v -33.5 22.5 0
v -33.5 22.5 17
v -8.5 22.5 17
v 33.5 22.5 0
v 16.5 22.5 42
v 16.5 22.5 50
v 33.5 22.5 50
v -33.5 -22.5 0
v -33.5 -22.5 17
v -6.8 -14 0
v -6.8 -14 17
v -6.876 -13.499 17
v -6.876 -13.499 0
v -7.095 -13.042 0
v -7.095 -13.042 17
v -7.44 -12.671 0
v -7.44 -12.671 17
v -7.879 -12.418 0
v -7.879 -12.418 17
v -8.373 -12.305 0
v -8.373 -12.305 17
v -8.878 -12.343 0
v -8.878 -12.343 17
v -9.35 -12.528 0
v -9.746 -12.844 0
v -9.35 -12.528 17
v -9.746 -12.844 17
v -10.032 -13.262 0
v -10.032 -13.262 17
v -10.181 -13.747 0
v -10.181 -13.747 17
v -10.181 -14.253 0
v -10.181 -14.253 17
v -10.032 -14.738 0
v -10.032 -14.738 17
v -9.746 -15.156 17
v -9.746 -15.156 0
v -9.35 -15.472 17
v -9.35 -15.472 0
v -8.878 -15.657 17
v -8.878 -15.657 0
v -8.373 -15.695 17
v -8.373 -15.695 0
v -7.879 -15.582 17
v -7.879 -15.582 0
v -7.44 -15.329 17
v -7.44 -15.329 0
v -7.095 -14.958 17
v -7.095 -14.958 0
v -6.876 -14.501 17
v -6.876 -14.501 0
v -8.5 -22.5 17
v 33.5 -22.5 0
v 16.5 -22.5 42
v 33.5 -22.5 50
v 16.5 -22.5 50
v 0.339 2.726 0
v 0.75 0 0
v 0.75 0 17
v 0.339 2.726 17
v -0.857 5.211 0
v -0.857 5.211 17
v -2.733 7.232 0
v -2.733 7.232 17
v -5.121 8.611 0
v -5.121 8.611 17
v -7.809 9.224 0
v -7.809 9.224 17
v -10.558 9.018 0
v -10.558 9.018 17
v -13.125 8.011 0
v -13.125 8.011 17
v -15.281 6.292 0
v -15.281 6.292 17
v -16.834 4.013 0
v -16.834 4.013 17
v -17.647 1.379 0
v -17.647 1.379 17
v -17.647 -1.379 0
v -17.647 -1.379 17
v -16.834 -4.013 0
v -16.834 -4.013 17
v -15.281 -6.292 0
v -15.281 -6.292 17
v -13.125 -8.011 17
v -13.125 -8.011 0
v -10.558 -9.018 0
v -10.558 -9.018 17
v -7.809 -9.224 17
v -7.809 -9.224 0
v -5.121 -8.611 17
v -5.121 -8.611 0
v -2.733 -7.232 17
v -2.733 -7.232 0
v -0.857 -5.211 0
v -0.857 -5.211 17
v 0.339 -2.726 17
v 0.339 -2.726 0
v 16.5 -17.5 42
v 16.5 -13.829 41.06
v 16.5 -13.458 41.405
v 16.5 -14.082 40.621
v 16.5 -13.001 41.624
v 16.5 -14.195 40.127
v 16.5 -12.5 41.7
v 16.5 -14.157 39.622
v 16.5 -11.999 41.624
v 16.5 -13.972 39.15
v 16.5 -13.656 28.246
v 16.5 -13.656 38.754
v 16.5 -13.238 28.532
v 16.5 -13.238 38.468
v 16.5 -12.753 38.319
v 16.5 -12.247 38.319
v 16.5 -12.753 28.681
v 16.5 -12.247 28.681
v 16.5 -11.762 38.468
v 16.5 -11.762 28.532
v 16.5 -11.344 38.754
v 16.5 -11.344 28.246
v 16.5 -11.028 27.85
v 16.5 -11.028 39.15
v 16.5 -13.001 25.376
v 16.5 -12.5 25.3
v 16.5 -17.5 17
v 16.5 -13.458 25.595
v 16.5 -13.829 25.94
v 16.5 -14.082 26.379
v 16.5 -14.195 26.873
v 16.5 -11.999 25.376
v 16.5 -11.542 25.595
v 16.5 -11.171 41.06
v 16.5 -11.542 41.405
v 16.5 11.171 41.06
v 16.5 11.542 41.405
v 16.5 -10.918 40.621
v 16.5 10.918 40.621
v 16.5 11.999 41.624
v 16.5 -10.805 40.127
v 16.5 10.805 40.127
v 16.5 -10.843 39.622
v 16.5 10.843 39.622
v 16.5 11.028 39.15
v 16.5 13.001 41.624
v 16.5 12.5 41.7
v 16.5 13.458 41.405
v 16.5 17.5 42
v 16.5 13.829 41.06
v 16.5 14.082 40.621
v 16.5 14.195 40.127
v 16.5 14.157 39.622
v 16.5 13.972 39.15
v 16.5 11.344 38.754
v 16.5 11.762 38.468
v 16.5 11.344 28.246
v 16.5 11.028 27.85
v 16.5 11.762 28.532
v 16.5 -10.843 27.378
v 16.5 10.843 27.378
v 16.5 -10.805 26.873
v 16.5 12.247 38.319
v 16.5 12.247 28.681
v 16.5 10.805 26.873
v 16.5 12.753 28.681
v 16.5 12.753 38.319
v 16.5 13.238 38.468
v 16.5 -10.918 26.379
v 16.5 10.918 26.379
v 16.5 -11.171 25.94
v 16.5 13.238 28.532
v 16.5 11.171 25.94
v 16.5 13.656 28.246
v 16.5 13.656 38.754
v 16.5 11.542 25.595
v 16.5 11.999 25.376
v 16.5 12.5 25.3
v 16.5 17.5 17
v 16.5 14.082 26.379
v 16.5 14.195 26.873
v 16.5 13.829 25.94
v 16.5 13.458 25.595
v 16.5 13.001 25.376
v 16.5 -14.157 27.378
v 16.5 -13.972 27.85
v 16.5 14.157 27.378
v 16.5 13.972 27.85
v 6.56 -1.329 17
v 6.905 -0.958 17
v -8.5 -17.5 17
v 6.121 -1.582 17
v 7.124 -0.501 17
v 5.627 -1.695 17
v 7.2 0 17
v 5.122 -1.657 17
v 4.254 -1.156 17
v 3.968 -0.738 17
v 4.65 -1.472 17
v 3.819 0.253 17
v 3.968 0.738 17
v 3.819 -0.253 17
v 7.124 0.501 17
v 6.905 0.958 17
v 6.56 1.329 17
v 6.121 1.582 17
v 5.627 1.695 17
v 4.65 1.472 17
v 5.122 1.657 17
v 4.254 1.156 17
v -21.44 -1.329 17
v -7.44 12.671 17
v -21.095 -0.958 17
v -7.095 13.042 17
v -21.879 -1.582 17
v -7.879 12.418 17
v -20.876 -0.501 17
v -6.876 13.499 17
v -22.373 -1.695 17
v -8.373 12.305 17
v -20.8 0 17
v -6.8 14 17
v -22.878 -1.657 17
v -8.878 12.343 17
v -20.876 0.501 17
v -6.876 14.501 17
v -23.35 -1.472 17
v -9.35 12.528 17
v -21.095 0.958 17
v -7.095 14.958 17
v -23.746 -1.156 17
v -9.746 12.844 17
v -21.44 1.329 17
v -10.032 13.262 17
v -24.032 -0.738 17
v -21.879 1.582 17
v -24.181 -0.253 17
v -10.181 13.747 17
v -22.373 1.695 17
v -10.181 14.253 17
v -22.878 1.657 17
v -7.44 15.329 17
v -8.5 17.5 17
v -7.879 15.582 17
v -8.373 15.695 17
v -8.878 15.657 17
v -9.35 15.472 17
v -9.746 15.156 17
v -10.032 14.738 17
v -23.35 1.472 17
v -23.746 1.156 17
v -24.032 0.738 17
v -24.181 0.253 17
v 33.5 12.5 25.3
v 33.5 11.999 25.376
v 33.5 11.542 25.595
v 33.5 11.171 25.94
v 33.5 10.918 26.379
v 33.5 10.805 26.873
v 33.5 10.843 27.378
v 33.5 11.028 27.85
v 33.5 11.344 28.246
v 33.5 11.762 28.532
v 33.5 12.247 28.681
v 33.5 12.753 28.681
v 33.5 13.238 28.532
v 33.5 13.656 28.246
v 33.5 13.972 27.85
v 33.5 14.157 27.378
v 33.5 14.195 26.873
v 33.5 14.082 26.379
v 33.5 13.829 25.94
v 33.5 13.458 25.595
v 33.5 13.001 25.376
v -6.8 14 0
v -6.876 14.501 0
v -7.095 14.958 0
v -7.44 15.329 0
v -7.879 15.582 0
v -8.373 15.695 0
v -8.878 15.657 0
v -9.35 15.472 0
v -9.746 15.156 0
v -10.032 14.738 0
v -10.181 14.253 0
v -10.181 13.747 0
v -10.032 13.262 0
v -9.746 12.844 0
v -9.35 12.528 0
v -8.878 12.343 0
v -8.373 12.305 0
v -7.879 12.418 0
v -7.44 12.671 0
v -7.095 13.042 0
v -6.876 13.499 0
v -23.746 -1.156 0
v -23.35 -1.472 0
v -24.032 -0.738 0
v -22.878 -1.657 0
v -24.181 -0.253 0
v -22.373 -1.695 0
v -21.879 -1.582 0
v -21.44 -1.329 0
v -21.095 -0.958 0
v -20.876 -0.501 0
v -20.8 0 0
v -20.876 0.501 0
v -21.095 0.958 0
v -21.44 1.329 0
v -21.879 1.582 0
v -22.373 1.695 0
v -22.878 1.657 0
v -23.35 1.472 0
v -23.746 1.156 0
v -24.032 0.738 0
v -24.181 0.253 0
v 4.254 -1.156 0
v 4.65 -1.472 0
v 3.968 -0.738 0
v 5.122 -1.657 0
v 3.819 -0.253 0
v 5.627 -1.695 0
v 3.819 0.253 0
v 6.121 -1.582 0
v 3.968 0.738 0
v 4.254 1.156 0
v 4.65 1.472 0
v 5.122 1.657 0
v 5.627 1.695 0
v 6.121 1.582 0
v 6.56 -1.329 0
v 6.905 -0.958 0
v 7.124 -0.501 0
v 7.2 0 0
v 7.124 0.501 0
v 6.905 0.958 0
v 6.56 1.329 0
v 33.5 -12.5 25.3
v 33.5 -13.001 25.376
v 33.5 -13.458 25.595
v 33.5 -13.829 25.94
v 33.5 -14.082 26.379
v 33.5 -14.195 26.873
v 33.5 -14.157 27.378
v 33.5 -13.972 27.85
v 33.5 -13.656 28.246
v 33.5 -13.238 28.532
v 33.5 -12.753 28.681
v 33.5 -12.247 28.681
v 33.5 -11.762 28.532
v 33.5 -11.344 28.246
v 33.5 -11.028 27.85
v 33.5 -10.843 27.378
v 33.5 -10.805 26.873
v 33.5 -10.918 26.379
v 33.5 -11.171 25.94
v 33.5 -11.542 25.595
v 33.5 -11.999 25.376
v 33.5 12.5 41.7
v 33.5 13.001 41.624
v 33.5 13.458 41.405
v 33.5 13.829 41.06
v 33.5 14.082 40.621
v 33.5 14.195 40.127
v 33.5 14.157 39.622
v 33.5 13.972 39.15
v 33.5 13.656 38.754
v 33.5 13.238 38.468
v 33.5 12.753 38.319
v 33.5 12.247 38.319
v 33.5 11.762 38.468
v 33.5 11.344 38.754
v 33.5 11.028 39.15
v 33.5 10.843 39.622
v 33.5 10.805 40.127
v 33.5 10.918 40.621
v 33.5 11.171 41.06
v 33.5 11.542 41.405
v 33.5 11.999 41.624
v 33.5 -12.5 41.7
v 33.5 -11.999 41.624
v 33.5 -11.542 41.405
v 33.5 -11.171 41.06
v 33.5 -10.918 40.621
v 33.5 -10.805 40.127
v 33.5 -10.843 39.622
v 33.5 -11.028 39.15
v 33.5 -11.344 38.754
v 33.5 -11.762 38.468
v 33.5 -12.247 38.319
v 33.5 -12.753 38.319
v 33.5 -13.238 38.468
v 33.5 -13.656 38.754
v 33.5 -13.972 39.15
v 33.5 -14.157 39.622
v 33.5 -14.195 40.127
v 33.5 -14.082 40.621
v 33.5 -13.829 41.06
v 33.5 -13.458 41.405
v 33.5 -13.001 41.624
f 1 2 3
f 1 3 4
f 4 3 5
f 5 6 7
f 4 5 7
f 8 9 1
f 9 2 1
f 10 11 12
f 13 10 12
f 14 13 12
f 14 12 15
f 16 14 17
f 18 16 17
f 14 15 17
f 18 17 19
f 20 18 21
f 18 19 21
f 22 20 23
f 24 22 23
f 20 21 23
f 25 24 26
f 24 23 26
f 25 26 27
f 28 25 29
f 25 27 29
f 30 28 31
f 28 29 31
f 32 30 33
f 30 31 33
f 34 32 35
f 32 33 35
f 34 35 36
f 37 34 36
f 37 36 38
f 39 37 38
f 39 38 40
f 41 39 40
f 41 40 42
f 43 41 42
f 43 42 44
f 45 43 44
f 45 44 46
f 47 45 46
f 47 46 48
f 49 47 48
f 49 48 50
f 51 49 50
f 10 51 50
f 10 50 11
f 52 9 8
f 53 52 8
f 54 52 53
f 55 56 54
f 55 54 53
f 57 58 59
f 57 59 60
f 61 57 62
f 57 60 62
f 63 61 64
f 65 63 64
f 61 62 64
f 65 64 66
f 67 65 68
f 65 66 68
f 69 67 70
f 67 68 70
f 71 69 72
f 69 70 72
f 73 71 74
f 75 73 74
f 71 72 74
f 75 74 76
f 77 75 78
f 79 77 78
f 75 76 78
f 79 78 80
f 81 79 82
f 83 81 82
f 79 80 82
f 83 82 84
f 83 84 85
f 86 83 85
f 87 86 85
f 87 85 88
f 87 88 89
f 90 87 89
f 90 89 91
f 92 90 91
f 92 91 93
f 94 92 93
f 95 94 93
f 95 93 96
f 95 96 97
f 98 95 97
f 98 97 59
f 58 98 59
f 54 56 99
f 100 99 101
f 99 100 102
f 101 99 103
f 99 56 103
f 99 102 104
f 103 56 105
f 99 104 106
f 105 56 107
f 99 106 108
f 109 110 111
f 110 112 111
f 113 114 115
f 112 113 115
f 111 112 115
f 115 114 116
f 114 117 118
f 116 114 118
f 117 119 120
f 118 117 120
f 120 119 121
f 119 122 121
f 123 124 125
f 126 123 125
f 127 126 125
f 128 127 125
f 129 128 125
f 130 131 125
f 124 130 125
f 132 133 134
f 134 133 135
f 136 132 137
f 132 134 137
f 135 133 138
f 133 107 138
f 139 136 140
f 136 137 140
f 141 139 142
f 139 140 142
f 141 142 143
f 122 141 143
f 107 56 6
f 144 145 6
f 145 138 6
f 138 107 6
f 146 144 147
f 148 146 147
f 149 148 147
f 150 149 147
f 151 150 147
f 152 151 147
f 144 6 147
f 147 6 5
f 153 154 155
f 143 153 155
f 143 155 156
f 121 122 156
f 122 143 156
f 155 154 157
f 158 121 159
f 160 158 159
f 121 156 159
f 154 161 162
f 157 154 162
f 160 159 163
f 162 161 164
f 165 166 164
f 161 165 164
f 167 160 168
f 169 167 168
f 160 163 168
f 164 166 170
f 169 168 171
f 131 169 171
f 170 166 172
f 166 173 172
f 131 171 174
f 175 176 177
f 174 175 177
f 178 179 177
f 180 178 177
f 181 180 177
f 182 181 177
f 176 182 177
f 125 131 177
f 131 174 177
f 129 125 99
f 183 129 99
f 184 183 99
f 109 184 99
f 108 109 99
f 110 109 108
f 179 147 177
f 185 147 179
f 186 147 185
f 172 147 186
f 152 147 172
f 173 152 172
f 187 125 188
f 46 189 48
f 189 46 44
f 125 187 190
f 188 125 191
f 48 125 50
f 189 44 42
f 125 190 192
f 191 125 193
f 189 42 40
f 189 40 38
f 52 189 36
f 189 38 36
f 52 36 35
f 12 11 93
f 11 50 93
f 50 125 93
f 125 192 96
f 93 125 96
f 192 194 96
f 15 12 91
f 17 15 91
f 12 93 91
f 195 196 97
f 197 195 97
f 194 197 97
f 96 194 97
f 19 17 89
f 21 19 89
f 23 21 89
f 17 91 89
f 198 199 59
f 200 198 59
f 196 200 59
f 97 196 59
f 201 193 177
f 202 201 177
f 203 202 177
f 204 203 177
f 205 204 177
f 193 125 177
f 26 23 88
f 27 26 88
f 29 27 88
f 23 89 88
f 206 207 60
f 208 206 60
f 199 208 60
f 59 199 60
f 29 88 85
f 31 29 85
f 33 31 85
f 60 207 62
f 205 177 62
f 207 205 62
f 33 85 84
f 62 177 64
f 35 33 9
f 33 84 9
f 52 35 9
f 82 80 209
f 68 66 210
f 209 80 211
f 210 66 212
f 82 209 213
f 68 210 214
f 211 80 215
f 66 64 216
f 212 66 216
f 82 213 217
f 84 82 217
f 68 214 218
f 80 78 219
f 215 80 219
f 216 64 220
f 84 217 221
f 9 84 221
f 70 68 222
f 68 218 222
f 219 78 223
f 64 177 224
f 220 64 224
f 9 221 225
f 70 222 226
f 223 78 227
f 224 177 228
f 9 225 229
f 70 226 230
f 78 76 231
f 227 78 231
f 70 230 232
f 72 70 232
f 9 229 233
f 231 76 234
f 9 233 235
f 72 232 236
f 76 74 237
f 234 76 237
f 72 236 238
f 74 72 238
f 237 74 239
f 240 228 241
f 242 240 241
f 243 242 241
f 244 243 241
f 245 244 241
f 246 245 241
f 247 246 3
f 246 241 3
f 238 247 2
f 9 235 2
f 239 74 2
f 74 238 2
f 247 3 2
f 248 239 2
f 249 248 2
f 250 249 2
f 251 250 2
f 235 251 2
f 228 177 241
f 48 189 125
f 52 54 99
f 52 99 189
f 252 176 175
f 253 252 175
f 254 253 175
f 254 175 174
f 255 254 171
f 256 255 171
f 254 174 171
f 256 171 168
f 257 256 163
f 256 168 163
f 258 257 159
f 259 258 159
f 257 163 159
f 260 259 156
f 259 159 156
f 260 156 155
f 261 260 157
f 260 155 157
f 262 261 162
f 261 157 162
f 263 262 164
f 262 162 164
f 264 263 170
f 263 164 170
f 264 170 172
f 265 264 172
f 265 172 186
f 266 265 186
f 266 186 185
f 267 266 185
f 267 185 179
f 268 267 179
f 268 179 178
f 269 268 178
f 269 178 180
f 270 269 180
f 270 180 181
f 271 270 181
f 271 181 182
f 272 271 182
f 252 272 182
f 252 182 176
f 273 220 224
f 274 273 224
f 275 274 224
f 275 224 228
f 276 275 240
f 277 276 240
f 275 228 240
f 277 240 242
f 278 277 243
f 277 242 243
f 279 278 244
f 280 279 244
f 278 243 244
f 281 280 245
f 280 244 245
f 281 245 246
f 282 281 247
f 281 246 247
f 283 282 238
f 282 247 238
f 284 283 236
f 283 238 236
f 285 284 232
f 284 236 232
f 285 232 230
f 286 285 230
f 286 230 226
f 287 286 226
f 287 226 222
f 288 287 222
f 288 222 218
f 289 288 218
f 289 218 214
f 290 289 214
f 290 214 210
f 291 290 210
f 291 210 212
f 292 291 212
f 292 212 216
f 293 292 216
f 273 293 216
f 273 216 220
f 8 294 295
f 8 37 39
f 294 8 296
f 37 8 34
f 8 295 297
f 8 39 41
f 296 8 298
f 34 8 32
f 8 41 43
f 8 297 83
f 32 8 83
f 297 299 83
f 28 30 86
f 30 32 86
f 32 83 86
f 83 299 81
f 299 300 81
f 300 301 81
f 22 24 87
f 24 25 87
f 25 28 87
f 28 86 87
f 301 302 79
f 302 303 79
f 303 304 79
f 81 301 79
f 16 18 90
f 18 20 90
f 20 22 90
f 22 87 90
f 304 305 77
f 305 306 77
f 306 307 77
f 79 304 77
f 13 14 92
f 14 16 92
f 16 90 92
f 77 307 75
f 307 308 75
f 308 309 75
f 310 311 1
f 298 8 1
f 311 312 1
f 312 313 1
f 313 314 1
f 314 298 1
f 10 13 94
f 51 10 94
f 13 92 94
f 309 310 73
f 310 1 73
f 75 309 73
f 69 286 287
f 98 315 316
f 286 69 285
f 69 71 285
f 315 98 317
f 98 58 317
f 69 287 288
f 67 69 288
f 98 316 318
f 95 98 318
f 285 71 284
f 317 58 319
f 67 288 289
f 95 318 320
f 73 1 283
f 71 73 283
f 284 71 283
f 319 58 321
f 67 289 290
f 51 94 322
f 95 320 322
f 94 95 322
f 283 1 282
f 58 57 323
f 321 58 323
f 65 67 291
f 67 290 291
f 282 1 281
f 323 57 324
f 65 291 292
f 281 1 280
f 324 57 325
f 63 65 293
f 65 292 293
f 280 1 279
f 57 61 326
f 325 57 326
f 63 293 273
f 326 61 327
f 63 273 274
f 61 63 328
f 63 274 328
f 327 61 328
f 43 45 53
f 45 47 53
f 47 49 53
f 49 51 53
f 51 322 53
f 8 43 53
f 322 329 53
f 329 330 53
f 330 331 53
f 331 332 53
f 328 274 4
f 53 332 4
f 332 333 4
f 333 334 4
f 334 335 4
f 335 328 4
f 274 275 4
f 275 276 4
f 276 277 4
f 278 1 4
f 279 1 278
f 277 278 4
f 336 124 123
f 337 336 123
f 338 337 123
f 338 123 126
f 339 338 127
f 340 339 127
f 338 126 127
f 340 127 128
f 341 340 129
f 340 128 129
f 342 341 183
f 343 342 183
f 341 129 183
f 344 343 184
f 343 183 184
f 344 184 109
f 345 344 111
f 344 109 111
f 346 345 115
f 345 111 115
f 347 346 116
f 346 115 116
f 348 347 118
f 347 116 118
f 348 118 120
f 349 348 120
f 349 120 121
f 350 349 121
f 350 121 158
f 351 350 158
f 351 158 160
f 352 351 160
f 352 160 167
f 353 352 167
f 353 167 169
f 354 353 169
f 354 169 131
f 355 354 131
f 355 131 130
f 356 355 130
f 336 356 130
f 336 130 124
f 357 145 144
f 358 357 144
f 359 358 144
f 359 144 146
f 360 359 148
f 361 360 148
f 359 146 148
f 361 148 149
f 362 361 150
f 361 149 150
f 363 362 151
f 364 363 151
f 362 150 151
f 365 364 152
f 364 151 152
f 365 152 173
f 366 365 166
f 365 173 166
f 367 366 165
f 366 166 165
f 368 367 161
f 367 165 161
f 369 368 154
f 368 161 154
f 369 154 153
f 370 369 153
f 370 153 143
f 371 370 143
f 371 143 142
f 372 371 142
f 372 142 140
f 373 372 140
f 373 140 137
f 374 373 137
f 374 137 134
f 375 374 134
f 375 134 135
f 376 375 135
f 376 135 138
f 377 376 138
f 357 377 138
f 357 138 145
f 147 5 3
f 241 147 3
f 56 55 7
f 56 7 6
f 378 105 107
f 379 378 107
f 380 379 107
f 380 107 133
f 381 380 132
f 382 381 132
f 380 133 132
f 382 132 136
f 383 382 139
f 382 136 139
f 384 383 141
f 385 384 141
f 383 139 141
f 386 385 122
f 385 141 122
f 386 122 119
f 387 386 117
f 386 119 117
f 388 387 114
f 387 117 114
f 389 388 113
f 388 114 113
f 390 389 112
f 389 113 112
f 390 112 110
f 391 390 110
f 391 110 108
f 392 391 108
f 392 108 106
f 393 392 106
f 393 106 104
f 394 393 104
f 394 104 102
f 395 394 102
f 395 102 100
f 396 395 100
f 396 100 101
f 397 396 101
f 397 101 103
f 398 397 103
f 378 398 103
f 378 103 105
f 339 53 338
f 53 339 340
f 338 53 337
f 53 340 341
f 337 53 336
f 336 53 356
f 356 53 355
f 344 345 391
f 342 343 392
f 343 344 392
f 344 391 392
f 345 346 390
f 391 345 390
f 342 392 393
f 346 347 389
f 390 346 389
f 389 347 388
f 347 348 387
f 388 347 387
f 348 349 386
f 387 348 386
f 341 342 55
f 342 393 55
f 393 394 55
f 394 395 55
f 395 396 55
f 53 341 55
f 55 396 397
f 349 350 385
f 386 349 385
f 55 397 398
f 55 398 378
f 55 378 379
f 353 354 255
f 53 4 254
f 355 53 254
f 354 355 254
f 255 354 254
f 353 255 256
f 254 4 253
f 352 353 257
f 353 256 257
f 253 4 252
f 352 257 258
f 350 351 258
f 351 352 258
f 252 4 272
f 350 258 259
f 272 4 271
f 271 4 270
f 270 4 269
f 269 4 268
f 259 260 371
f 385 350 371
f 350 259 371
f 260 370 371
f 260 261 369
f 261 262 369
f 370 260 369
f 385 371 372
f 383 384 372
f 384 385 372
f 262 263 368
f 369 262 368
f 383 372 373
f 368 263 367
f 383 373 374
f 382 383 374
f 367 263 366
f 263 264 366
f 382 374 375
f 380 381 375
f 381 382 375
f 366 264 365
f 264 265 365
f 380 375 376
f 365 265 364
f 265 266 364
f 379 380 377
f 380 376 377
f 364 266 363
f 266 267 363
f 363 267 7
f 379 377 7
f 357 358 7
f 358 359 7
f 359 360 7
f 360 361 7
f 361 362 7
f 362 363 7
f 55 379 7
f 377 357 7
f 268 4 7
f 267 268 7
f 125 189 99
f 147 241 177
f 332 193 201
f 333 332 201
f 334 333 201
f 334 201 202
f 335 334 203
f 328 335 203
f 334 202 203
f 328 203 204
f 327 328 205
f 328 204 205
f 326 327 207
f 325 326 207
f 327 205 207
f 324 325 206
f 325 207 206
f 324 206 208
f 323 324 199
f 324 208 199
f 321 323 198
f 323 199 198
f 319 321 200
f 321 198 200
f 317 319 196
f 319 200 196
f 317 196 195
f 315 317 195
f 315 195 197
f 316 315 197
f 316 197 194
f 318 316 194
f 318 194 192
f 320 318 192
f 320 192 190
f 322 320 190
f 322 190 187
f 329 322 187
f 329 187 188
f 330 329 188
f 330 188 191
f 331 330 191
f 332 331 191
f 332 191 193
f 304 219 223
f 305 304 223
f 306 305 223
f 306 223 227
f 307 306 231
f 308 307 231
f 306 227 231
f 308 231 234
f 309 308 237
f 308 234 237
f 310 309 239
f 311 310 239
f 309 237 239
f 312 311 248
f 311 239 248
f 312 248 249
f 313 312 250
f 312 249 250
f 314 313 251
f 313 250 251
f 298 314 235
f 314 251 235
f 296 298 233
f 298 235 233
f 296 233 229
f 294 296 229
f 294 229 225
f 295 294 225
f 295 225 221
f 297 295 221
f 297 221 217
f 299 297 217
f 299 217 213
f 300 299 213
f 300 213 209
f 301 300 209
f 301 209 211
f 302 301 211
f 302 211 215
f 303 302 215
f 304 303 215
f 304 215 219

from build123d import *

# Parameters (mm, degrees)
BOSS_EXTRUDE1_DEPTH = 22.5
SKETCH2_R           = 9.25
SKETCH2_R_2         = 1.7
CUT_EXTRUDE1_DEPTH  = 53.129646076
SKETCH3_R           = 1.7
CUT_EXTRUDE2_DEPTH  = 75.204110398
BOSS_EXTRUDE4_DEPTH = 5
BOSS_EXTRUDE5_DEPTH = 5


with BuildPart() as part:
    # Sketch1 → Boss-Extrude1 (new, symmetric)
    with BuildSketch(Plane(origin=(0, 0, 0), x_dir=(-1, 0, 0), z_dir=(0, 1, 0))):
        Polygon((-33.5, 50), (-16.5, 50), (-16.5, 17), (33.5, 17), (33.5, 0), (-33.5, 0), align=None)
    extrude(amount=BOSS_EXTRUDE1_DEPTH, both=True)

    # Sketch2 → Cut-Extrude1 (cut, through all)
    with BuildSketch(Plane.XY.offset(17)):
        with Locations((-8.5, 0)):
            Circle(SKETCH2_R)
        with Locations((-8.5, 14)):
            Circle(SKETCH2_R_2)
        with Locations((5.5, 0)):
            Circle(SKETCH2_R_2)
        with Locations((-8.5, -14)):
            Circle(SKETCH2_R_2)
        with Locations((-22.5, 0)):
            Circle(SKETCH2_R_2)
    extrude(amount=-CUT_EXTRUDE1_DEPTH, mode=Mode.SUBTRACT)

    # Sketch3 → Cut-Extrude2 (cut, through all)
    with BuildSketch(Plane(origin=(16.5, 0, 0), x_dir=(0, -1, 0), z_dir=(-1, 0, 0))):
        with Locations(Location((12.5, 40, 0), (0, 0, 90))):
            Circle(SKETCH3_R)
        with Locations(Location((-12.5, 40, 0), (0, 0, 90))):
            Circle(SKETCH3_R)
        with Locations(Location((12.5, 27, 0), (0, 0, 270))):
            Circle(SKETCH3_R)
        with Locations(Location((-12.5, 27, 0), (0, 0, 270))):
            Circle(SKETCH3_R)
    extrude(amount=-CUT_EXTRUDE2_DEPTH, mode=Mode.SUBTRACT)

    # Sketch8 → Boss-Extrude4 (add)
    with BuildSketch(Plane(origin=(0, 22.5, 0), x_dir=(-1, 0, 0), z_dir=(0, 1, 0))):
        Polygon((-16.5, 42), (8.5, 17), (-16.5, 17), align=None)
    extrude(amount=-BOSS_EXTRUDE4_DEPTH)

    # Sketch9 → Boss-Extrude5 (add)
    with BuildSketch(Plane.XZ.offset(22.5)):
        Polygon((-8.5, 17), (16.5, 17), (16.5, 42), align=None)
    extrude(amount=-BOSS_EXTRUDE5_DEPTH)


solid = part.part
